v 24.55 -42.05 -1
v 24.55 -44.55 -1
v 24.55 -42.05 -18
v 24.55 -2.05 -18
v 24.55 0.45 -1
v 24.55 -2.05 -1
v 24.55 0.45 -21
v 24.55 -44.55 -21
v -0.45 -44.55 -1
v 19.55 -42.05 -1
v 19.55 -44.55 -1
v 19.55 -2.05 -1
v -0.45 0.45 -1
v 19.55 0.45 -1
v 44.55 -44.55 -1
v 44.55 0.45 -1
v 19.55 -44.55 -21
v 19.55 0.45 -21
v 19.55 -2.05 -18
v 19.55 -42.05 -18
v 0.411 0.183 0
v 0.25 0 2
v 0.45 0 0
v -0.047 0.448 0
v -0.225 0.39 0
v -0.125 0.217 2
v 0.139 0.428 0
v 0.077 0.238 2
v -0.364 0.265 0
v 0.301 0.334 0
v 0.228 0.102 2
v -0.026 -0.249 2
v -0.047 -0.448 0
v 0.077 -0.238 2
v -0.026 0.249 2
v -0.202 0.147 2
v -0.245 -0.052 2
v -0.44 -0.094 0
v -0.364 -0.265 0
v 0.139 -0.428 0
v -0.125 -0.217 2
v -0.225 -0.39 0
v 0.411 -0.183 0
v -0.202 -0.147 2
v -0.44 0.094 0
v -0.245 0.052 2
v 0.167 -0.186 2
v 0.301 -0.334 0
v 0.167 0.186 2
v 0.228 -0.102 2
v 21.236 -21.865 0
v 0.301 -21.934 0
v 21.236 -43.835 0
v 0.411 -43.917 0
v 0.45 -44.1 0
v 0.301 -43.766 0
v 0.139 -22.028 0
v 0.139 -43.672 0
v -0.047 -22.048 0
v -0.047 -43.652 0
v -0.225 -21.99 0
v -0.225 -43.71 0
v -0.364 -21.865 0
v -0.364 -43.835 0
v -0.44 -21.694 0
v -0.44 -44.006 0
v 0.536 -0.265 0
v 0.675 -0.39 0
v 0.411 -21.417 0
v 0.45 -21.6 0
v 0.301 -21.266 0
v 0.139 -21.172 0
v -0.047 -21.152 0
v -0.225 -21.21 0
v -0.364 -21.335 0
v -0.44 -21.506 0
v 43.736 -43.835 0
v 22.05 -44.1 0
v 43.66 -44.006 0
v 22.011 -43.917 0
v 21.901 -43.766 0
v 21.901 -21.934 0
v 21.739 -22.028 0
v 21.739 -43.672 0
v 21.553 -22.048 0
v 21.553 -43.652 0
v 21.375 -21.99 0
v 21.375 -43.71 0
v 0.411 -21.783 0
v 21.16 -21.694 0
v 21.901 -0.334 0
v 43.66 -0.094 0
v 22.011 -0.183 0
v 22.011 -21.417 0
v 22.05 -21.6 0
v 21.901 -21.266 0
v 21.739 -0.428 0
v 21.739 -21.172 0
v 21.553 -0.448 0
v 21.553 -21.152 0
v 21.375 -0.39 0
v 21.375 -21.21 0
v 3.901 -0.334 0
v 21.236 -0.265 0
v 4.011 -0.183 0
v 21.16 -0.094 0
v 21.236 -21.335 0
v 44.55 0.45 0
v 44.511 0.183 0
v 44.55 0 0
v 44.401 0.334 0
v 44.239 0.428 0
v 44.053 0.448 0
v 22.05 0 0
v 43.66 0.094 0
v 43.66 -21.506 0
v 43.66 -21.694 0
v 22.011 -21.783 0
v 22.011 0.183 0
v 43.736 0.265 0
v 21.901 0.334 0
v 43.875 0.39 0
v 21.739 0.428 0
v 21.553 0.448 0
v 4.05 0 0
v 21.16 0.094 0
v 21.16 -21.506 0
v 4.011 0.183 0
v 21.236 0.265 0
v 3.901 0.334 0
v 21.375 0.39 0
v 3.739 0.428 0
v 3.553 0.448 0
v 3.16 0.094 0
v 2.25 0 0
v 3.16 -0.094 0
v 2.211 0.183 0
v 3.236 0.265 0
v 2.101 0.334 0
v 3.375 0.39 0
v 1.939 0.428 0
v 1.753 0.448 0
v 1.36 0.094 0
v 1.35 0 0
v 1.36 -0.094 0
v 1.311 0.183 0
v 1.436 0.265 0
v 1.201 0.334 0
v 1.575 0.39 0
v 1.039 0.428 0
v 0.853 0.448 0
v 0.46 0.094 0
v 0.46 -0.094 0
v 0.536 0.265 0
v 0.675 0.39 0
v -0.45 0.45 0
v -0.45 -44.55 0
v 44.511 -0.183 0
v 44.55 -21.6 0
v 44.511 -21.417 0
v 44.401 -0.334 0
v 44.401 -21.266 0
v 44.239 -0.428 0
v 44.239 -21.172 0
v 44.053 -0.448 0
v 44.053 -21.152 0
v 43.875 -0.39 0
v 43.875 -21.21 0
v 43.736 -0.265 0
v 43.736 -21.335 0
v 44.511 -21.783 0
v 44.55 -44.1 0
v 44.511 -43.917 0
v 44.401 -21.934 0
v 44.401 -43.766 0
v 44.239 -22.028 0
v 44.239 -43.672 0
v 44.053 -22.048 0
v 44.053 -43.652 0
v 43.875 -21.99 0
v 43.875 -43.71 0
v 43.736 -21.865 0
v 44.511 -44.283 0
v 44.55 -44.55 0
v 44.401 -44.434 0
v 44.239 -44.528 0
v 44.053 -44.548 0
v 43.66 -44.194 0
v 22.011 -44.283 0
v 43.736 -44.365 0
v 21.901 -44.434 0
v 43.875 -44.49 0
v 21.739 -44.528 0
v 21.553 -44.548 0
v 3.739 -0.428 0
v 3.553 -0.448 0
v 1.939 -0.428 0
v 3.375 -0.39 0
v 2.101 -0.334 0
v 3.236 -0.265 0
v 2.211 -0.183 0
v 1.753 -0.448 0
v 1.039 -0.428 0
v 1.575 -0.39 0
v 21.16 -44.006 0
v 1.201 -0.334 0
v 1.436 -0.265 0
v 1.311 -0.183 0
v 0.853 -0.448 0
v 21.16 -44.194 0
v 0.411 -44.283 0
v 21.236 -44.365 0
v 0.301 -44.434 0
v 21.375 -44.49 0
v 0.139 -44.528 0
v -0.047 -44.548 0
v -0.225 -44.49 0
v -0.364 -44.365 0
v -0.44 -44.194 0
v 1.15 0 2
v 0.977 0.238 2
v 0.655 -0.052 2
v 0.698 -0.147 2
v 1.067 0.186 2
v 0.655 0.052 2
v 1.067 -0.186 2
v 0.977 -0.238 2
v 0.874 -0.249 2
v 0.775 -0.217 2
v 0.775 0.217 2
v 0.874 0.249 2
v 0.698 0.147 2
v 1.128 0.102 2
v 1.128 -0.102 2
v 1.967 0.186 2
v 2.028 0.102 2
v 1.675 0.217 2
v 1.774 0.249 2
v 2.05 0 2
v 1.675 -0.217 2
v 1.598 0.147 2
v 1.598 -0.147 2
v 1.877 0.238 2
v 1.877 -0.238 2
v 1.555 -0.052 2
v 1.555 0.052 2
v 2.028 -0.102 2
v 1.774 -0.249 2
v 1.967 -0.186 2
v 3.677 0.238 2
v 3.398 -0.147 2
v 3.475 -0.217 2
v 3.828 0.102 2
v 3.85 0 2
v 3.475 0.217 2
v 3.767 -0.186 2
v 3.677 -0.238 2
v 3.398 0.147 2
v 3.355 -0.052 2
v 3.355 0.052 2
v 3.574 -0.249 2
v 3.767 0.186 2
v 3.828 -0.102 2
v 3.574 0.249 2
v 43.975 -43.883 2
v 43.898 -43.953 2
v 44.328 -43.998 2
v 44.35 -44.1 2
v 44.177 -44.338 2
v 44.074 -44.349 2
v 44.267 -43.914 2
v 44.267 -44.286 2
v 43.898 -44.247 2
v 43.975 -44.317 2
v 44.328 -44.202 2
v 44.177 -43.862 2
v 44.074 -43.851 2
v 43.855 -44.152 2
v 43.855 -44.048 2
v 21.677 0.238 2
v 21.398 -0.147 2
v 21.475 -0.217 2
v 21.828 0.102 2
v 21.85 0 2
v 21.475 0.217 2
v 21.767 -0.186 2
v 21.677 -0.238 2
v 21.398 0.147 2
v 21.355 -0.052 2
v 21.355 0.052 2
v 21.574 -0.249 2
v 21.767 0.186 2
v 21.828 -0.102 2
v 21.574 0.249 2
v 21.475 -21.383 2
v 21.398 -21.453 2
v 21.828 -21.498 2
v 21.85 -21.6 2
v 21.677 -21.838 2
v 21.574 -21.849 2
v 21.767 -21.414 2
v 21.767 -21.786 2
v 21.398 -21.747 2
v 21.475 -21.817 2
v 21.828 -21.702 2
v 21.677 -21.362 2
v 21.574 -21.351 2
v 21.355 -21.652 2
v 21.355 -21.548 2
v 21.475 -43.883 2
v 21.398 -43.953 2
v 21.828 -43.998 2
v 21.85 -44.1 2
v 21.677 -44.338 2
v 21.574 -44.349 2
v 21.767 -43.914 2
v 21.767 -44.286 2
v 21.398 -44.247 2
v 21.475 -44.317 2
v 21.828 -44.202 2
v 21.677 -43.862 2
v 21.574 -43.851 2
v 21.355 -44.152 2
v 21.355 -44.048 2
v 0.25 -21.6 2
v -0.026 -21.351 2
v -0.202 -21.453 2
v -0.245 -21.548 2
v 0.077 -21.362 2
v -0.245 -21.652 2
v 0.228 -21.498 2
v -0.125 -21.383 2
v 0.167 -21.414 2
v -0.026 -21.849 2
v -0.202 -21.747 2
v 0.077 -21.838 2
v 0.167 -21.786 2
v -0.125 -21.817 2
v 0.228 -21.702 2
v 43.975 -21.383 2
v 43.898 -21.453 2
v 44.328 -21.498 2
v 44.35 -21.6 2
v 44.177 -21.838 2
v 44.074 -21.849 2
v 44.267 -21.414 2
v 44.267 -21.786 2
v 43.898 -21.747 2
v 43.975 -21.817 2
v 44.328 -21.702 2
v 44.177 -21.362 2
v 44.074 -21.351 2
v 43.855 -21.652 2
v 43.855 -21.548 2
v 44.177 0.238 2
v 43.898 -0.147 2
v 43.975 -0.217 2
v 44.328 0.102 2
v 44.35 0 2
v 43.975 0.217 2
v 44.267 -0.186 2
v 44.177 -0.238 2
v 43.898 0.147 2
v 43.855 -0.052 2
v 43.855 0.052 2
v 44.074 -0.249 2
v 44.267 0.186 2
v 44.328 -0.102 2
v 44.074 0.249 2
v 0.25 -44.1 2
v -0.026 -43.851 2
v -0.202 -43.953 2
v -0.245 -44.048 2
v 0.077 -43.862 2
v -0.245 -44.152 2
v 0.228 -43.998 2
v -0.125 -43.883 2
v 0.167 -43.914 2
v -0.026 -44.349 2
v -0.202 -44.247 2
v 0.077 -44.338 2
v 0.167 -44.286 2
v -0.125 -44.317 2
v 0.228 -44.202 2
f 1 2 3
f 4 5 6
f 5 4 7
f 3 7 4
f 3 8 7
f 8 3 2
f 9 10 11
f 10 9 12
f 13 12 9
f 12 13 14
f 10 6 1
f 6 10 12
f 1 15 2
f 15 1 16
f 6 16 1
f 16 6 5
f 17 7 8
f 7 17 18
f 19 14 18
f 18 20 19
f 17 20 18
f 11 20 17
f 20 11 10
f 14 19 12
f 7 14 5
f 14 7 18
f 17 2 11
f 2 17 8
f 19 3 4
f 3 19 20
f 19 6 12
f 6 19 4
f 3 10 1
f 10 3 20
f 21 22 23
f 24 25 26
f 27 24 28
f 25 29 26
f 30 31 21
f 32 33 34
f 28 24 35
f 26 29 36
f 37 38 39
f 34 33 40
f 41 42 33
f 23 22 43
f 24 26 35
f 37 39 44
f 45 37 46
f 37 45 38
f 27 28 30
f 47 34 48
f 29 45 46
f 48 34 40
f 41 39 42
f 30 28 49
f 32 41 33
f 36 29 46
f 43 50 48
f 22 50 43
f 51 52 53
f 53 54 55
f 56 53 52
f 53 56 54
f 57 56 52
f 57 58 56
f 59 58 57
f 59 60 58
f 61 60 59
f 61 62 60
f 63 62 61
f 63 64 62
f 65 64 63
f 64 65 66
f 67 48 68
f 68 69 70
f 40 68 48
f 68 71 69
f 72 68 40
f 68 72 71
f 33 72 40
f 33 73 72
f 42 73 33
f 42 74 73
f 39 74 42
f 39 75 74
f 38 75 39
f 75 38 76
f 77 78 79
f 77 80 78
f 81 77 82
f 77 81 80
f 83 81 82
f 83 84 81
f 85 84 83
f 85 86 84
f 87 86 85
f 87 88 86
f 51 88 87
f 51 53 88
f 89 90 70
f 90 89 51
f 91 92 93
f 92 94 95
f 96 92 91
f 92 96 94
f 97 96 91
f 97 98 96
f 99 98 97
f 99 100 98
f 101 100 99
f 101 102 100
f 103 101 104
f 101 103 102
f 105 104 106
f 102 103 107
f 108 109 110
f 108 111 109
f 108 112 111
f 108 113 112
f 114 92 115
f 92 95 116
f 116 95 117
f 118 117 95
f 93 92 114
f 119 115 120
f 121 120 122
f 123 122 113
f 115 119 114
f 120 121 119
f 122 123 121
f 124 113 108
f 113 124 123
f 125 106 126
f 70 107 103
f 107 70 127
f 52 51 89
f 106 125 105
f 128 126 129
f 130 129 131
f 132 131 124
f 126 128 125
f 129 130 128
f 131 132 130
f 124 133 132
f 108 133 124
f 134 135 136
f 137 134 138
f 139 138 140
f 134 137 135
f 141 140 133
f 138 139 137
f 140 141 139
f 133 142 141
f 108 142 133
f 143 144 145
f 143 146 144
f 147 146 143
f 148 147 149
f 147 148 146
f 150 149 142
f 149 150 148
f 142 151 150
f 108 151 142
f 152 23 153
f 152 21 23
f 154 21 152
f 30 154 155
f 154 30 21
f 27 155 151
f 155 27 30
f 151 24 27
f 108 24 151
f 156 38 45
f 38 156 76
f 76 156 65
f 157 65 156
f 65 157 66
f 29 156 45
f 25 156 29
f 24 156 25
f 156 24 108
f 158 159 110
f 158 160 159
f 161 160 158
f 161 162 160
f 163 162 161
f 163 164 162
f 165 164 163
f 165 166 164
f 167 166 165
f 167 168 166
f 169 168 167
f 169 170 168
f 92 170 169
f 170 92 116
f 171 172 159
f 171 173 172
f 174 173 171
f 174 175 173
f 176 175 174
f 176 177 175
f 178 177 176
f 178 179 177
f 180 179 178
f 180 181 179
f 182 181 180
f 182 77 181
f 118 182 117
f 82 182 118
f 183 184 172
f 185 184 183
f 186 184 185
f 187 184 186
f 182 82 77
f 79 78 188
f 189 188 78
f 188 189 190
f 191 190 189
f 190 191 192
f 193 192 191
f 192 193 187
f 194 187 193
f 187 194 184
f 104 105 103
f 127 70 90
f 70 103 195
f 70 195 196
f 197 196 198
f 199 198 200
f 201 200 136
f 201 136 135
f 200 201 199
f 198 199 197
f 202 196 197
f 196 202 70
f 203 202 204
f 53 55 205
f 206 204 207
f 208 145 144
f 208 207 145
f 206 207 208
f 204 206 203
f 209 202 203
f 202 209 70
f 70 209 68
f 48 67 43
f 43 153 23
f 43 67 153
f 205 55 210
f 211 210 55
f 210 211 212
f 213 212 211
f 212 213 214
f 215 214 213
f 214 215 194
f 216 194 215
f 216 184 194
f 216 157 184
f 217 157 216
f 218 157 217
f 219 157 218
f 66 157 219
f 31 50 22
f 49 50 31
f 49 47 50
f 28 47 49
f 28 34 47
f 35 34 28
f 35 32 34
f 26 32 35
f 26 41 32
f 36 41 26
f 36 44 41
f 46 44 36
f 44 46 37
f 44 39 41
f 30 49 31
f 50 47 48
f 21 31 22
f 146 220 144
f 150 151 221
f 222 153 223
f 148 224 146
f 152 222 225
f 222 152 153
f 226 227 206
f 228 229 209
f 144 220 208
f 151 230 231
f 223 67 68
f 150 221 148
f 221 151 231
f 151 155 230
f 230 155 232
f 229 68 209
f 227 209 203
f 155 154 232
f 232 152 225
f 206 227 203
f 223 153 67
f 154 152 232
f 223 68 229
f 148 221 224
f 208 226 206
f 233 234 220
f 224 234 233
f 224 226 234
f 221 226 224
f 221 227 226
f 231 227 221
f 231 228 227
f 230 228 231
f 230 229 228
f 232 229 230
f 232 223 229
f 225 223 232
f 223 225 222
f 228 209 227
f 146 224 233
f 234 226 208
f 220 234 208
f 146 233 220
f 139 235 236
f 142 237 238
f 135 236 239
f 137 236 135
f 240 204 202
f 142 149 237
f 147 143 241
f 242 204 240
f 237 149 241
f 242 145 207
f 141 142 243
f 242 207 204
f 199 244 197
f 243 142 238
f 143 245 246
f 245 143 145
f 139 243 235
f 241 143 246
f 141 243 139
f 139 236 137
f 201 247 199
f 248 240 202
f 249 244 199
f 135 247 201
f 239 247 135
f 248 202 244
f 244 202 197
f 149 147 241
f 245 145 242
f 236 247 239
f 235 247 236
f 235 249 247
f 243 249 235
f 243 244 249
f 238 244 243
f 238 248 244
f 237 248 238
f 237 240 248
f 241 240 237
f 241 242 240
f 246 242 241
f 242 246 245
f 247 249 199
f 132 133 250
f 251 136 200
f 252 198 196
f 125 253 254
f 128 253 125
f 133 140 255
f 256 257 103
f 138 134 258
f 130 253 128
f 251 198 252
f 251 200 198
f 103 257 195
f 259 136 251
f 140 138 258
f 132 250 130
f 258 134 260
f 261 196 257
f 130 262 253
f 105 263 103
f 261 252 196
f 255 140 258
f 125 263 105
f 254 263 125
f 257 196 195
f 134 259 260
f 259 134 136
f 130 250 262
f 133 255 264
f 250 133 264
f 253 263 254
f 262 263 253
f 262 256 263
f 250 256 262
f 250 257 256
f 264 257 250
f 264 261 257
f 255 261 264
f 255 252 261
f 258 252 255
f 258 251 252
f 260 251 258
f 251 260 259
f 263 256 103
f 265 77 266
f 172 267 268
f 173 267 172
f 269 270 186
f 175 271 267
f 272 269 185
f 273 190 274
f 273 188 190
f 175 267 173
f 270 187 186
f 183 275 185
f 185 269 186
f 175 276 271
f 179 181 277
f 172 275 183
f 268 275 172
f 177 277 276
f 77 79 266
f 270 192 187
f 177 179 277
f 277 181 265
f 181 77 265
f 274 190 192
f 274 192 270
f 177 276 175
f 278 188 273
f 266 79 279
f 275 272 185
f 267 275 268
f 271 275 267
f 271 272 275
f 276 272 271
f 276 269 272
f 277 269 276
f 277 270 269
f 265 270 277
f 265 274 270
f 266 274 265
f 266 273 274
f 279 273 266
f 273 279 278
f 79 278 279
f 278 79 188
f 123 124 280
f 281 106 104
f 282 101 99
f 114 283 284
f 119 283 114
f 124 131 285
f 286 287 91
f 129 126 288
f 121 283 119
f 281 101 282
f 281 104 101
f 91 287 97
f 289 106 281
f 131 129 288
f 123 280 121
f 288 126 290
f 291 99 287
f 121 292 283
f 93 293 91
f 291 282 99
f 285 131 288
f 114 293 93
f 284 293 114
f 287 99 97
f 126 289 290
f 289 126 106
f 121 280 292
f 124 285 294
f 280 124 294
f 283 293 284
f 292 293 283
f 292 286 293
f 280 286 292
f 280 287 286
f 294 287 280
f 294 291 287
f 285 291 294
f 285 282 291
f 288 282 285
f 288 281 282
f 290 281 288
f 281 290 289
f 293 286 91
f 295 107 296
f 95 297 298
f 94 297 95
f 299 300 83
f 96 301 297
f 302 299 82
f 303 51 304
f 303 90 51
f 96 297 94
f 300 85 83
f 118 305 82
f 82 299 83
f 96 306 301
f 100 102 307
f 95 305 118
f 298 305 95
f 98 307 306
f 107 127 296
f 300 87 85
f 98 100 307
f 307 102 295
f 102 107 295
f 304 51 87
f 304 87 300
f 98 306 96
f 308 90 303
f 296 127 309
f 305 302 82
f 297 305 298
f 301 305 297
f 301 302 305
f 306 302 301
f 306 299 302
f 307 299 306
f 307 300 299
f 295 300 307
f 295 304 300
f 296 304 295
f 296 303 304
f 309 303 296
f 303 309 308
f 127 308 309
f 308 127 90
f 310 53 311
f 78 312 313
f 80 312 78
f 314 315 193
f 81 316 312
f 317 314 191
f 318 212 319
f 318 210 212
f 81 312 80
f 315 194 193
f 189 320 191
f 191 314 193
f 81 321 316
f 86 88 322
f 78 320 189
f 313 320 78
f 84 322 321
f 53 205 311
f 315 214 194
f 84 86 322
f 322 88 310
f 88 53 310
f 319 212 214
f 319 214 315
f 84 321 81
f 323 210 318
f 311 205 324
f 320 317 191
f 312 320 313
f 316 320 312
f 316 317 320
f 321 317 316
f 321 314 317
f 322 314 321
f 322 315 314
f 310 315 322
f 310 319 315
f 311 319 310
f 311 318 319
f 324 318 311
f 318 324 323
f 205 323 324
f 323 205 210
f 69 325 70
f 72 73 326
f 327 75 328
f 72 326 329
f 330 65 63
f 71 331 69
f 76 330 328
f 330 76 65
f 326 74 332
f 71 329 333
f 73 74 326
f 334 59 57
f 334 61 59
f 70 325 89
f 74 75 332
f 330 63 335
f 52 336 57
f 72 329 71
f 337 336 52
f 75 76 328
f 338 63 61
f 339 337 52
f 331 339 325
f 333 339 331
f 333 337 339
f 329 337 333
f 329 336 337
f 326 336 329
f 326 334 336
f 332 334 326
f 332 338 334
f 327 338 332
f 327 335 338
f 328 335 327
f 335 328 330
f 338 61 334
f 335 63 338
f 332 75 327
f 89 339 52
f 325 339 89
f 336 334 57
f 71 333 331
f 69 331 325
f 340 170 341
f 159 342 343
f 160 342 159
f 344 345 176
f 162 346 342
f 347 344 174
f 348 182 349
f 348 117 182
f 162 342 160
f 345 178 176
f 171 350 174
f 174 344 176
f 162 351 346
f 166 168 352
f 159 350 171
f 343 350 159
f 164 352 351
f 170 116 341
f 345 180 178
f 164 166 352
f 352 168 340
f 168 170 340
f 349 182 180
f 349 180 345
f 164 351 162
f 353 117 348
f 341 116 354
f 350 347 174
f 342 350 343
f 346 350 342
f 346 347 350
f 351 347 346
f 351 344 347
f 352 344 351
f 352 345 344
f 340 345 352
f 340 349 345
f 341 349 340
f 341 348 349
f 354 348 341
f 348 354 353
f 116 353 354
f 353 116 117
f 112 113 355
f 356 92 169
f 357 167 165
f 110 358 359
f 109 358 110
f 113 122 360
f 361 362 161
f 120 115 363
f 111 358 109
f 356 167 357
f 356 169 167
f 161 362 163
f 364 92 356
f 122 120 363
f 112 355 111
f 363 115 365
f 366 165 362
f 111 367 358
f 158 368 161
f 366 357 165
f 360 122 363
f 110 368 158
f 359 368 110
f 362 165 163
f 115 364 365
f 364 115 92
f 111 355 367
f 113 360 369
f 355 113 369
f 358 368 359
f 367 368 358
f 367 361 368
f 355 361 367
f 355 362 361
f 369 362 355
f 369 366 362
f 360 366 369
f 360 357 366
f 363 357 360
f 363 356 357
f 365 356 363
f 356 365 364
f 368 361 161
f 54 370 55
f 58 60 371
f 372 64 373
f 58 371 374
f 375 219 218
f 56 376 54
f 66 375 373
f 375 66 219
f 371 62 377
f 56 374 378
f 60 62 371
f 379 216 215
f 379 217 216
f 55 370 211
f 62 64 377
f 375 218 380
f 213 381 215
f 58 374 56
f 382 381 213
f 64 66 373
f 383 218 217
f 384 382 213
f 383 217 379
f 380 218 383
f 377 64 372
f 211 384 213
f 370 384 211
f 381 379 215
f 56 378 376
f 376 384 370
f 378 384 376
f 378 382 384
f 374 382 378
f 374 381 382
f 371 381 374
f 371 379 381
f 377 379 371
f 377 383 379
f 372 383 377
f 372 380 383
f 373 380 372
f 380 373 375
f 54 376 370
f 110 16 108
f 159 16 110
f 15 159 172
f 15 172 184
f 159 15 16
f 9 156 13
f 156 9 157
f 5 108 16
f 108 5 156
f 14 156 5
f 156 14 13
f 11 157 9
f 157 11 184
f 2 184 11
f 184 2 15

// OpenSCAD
$fn=15;
gridLength = 45;
gridSquares = 50;
oneGridLength = gridLength / gridSquares;
platformThickness = 1;
handleThickness = 5;
handleHeight = 20;

module buildPlatform(){
  translate([22.05,-22.05, -0.5 * platformThickness])
  cube([45,45,platformThickness], center = true);  
    
}

module buildHandle(){
    translate([22.05,-22.05,-0.5 * handleHeight - platformThickness])
    difference(){
        cube([handleThickness, 45, handleHeight], center = true);
        translate([0,0,4])
        cube([handleThickness + 1, 40, 22], center = true);
    }
    
    
}

module buildStamp(coordinates){
  buildPlatform();
  buildHandle();
  
  for (i=[0:1:len(coordinates) - 1]){
    coordinate = coordinates[i];
    rowNumber = coordinate[0];
    columnNumber = coordinate[1];
    translate([columnNumber * oneGridLength,rowNumber * -1 * oneGridLength,0])
        cylinder(h=2,d1=oneGridLength, d2 = 0.5);
      
  }
    
}

//Coordinates example: 
buildStamp(sender_coordinates);

sender_coordinates = [[0,0], [0,1], [0,2], [0,4], [49,49], [0, 24], [24, 24], [49, 24], [24, 0], [24, 49], [0, 49], [49, 0]];
